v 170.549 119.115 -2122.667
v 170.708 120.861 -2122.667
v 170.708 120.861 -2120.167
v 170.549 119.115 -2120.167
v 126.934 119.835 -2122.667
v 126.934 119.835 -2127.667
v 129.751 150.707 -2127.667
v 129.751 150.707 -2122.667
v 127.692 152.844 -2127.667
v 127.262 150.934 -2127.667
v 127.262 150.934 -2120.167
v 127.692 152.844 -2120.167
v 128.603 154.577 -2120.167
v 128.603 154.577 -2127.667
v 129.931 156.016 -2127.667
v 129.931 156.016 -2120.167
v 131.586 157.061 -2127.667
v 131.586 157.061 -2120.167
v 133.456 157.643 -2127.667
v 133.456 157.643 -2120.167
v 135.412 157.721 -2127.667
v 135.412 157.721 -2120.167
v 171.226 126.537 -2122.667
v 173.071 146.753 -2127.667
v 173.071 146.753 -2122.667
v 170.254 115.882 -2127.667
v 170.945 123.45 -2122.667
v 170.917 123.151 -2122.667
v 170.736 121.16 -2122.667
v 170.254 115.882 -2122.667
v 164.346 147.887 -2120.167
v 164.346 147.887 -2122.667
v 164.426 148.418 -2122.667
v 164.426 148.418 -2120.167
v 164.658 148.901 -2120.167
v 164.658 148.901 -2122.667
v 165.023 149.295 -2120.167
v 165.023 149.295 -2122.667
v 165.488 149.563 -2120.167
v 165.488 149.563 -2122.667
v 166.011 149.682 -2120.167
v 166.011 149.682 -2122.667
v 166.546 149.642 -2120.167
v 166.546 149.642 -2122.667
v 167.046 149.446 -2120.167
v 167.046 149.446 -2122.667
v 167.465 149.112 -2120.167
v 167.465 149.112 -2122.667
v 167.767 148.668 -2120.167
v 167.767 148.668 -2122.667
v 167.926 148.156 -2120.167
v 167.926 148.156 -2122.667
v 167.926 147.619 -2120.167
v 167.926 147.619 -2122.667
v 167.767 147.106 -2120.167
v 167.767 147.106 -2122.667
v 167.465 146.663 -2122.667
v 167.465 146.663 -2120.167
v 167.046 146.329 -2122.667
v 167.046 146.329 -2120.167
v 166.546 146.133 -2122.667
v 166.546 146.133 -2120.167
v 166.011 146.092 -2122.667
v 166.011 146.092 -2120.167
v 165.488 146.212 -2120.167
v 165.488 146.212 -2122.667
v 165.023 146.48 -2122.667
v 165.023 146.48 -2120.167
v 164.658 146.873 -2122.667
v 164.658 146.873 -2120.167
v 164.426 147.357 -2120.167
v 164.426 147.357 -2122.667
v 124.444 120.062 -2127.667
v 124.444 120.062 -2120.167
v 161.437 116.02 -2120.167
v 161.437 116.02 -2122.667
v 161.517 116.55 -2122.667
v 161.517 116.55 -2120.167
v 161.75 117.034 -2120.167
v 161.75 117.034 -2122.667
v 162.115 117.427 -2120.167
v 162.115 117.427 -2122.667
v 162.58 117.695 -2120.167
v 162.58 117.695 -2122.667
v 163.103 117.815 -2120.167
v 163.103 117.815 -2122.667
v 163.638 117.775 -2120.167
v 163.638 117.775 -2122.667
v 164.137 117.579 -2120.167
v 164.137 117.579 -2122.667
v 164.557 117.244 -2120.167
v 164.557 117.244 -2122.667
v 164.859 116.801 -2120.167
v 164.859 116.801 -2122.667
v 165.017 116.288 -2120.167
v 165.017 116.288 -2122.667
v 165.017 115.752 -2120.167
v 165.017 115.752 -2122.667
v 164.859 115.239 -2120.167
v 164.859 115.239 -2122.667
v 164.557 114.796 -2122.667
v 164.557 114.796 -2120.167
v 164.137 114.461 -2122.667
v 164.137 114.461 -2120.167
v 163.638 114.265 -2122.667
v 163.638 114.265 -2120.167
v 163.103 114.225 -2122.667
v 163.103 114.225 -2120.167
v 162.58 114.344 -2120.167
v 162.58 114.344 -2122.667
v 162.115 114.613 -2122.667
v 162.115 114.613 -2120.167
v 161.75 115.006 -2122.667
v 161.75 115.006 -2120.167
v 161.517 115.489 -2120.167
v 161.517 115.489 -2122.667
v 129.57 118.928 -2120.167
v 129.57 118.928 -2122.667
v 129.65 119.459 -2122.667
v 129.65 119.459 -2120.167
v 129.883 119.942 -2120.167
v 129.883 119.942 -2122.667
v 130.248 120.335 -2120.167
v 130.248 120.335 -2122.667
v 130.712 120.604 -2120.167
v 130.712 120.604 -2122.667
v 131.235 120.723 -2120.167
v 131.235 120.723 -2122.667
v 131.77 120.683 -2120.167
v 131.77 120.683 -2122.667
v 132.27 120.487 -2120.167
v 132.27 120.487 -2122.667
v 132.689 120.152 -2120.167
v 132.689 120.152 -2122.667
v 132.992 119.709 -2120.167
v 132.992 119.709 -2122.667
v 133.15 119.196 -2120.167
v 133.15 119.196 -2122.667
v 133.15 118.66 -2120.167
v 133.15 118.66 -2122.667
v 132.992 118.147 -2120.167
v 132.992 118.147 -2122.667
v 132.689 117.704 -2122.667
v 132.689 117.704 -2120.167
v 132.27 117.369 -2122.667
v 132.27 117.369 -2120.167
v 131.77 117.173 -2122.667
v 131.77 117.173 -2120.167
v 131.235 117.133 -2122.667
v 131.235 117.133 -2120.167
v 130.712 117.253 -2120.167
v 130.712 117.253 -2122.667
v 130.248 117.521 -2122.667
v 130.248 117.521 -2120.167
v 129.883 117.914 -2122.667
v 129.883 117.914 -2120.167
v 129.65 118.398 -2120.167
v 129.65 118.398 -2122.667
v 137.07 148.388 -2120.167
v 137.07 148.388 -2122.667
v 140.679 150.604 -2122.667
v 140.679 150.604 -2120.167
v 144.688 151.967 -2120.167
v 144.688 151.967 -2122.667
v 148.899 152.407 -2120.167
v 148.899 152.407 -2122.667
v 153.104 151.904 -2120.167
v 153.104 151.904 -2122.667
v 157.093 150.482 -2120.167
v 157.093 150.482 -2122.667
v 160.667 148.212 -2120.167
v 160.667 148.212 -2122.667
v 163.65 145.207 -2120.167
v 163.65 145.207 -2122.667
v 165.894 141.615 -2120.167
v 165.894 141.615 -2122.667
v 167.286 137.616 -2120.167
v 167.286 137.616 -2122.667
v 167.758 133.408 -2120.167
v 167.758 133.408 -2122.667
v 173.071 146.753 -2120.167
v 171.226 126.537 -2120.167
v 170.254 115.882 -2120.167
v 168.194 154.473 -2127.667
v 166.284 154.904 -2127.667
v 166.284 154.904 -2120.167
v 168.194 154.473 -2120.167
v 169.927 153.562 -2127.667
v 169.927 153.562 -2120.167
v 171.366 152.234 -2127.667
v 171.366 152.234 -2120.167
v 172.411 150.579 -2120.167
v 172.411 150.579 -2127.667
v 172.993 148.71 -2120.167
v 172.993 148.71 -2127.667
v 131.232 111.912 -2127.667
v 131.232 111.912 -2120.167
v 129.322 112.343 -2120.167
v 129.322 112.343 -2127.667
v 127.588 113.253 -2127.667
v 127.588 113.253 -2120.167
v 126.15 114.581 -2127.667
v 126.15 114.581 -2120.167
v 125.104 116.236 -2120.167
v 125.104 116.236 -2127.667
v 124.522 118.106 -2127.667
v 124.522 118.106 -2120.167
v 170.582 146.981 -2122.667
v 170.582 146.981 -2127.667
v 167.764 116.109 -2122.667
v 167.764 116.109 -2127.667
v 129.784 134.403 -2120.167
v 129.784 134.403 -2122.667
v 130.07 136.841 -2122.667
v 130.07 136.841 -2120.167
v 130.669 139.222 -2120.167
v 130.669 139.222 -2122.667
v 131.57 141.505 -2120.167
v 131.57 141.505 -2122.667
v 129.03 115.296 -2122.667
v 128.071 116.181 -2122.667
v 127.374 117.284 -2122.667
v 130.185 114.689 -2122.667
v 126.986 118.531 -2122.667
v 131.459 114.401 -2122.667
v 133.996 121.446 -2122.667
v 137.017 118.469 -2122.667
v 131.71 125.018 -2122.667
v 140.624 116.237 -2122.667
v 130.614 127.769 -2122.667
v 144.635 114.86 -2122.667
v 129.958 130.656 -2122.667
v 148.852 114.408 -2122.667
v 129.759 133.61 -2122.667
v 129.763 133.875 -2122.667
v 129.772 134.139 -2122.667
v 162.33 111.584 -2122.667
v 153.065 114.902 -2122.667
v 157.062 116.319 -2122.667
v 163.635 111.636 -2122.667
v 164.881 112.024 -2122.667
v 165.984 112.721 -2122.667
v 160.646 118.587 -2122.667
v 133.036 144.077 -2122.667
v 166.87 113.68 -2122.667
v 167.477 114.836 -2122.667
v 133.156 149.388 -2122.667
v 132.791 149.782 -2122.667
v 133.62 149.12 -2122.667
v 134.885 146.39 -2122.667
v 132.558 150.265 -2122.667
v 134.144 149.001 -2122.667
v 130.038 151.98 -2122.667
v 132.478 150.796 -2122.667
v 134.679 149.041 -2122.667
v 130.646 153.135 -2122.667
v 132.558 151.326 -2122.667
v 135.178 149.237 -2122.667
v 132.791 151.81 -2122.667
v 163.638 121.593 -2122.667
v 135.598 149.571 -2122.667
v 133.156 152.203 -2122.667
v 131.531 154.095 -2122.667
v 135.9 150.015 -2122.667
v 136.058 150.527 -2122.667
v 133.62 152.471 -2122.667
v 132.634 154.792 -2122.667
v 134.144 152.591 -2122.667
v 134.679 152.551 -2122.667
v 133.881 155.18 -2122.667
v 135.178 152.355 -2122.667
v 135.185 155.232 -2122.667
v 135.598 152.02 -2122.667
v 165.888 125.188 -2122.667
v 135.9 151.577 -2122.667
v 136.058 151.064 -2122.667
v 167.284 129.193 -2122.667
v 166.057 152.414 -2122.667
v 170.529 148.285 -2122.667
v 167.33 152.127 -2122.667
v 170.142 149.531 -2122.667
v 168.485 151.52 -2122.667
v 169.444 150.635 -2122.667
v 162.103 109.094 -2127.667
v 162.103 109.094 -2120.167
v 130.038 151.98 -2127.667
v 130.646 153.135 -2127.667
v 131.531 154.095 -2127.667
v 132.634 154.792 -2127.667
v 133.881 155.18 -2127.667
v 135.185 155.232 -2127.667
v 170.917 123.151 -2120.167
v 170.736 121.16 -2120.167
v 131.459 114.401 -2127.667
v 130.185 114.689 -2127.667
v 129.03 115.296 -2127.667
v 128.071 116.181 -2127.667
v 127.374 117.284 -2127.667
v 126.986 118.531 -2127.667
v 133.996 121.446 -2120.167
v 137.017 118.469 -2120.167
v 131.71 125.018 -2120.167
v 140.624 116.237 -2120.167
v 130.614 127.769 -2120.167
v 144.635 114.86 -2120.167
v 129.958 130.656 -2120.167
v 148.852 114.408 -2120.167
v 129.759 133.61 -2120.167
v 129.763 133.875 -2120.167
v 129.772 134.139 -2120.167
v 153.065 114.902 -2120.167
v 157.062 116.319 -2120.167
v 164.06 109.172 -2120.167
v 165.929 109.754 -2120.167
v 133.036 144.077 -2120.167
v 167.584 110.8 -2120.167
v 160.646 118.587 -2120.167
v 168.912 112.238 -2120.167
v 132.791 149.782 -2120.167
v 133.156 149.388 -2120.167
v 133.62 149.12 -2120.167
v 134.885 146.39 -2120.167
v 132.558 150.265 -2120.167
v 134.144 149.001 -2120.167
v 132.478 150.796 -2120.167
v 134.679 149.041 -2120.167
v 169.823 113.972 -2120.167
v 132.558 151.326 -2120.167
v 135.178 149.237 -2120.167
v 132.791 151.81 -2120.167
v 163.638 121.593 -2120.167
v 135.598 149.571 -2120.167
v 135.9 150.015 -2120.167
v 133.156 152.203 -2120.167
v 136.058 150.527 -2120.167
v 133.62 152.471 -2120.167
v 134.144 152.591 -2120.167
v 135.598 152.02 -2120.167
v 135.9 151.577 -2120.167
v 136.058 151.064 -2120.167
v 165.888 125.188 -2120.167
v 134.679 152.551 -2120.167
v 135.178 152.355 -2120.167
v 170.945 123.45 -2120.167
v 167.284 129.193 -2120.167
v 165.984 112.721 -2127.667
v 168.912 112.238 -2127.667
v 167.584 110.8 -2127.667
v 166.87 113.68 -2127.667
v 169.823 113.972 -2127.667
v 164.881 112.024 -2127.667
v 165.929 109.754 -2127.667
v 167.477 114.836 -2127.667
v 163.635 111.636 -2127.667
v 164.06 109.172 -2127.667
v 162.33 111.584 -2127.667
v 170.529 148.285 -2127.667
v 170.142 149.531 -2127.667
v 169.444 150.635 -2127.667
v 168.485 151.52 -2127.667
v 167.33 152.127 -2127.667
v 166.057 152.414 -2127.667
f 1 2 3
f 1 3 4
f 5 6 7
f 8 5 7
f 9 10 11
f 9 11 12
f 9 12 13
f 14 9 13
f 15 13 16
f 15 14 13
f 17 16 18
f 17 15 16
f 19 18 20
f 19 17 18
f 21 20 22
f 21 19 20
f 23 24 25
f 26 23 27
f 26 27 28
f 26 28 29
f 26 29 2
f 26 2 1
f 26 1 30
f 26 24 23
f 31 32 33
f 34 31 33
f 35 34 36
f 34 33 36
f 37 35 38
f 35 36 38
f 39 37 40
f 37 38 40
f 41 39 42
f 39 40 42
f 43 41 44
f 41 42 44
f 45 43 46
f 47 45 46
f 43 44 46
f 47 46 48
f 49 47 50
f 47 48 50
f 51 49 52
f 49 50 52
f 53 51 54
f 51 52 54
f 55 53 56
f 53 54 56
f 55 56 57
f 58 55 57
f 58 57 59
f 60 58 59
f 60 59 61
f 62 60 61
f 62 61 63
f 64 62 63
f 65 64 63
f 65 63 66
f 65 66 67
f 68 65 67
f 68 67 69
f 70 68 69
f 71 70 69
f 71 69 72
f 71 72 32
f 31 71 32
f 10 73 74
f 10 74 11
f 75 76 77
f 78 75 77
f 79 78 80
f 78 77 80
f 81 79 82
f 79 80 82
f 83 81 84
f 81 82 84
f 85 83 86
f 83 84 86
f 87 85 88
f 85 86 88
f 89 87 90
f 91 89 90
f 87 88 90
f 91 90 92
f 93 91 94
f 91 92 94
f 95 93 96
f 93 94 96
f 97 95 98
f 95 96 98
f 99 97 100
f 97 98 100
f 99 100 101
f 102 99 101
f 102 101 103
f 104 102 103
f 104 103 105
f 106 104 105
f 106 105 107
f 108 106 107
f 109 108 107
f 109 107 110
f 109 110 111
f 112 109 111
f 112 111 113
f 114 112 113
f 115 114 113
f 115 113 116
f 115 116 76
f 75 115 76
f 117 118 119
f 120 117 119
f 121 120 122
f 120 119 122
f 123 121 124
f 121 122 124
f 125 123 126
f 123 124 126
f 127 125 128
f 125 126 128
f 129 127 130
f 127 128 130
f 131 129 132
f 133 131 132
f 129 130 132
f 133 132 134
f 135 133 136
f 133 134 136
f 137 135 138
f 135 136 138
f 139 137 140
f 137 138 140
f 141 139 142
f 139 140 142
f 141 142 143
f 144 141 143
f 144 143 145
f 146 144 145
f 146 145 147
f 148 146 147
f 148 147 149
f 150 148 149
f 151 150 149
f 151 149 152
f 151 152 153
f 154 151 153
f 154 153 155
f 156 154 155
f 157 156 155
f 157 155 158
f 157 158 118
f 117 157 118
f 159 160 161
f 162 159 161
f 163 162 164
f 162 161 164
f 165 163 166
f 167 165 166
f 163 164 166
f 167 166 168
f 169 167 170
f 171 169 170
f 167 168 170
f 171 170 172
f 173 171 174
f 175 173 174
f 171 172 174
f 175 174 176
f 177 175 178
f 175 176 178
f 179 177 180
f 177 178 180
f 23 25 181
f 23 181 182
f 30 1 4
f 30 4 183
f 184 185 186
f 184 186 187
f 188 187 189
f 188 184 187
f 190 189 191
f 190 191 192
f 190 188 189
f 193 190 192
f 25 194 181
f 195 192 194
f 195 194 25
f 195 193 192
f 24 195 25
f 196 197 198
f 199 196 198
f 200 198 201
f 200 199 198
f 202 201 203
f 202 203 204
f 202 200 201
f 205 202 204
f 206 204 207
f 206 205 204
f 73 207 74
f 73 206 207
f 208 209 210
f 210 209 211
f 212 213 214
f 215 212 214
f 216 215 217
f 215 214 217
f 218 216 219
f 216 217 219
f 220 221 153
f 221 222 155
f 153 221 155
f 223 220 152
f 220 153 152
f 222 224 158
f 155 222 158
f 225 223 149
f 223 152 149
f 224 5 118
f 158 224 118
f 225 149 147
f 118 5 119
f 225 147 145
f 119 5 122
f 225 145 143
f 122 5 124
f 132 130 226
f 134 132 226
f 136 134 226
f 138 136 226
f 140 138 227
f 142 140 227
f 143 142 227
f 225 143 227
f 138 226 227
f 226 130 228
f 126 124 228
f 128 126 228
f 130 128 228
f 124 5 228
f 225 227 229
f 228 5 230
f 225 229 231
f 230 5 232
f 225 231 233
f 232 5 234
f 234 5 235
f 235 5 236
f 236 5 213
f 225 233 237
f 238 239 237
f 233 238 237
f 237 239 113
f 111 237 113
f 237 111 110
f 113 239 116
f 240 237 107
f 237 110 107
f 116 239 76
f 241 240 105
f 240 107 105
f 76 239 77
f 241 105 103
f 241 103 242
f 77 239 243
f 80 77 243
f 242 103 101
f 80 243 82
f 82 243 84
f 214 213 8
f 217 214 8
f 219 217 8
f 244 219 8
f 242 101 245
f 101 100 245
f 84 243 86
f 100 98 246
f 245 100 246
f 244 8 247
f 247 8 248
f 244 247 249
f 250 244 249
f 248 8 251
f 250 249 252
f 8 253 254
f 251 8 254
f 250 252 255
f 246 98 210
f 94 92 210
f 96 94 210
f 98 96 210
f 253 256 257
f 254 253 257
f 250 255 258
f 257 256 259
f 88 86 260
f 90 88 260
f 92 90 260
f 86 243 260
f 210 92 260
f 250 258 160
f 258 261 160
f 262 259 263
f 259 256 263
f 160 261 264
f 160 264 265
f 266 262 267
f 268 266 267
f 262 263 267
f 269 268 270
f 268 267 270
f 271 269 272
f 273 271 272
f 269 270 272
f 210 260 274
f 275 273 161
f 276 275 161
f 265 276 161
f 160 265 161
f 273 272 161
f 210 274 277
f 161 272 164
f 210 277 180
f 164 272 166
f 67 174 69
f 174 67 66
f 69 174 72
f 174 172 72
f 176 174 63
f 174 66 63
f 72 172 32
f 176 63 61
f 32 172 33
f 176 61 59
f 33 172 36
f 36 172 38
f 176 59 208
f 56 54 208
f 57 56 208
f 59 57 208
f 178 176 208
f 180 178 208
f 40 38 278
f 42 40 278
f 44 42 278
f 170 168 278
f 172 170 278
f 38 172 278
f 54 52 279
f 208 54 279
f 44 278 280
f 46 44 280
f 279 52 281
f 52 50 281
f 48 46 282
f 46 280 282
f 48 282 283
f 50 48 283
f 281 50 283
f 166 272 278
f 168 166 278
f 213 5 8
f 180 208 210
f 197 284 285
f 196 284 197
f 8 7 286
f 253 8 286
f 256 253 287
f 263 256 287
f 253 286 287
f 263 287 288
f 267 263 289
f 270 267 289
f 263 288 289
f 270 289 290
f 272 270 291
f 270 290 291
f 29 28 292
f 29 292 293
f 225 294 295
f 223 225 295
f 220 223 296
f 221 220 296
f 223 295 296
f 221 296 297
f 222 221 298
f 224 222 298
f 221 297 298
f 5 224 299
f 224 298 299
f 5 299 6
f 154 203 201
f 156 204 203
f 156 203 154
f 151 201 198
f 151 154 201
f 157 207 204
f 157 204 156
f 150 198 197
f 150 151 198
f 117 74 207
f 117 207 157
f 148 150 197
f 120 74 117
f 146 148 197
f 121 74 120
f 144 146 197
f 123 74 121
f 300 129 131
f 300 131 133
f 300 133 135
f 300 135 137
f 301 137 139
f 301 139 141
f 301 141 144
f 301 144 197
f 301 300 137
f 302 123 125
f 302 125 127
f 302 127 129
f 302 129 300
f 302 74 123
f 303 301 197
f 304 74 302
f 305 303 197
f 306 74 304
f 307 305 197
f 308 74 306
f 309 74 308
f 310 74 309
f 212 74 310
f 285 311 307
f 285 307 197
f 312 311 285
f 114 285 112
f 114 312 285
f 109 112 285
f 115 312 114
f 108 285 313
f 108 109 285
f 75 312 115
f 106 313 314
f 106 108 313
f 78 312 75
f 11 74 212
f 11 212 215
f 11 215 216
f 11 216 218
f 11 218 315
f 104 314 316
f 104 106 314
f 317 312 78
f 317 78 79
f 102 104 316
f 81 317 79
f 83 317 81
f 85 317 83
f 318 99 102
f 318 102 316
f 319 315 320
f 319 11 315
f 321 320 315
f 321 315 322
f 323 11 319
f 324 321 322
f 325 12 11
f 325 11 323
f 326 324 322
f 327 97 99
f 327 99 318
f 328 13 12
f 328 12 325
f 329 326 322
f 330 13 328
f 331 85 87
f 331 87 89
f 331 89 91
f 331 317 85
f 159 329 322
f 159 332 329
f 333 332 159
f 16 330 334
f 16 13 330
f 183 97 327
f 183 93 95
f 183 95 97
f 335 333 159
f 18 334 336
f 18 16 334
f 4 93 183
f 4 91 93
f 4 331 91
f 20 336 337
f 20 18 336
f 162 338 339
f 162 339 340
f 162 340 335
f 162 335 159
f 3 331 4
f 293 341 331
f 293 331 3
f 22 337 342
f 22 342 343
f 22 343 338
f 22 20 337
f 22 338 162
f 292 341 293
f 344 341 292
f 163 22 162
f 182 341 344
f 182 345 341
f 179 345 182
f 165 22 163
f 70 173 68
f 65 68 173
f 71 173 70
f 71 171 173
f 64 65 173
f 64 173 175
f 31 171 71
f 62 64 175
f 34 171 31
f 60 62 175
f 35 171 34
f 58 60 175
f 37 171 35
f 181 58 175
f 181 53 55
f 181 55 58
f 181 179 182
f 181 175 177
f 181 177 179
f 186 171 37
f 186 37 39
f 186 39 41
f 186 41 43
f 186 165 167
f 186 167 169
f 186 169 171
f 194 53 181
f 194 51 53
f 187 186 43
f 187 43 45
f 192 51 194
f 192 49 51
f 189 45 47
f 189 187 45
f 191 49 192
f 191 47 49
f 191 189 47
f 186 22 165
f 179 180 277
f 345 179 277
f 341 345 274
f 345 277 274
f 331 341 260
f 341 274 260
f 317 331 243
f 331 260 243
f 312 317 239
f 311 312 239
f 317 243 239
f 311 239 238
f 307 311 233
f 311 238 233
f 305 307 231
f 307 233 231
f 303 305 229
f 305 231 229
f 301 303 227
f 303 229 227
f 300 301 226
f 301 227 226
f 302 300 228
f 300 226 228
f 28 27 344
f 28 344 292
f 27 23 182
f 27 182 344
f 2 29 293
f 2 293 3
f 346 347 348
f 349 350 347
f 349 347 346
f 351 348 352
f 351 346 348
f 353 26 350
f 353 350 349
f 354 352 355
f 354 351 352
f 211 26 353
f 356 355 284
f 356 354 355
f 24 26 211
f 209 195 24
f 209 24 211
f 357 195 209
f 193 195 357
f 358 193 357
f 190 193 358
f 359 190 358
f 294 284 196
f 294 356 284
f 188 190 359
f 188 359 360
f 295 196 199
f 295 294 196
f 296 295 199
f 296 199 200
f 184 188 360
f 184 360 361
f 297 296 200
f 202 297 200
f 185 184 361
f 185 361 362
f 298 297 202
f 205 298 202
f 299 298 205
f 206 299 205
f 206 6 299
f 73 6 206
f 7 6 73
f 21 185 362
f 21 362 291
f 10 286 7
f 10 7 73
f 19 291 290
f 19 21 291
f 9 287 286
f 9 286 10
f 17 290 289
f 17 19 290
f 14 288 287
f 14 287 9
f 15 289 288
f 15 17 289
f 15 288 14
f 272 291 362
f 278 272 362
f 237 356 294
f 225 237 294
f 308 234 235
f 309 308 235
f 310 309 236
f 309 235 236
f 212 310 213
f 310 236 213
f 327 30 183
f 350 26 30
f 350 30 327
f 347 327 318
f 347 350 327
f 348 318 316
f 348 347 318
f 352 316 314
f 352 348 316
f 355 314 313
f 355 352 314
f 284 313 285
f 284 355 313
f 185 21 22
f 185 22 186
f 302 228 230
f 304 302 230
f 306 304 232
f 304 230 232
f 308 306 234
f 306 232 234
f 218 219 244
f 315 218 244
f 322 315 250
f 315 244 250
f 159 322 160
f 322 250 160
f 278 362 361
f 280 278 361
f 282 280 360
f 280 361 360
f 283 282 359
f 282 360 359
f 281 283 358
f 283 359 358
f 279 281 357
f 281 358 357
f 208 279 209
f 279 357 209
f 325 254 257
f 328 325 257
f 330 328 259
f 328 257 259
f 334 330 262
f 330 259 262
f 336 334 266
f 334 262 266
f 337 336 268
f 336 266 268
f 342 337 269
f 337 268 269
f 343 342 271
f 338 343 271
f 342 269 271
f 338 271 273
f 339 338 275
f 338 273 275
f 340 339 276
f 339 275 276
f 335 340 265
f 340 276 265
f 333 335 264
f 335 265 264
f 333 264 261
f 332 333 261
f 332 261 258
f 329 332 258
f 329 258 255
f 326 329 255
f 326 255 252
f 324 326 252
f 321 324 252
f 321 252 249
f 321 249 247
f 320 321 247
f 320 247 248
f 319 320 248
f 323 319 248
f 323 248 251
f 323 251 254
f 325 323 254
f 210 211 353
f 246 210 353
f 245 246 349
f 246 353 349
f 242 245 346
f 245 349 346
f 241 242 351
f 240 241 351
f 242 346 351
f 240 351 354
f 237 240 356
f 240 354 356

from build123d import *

# Parameters (mm, degrees)
BOSS_EXTRUDE2_DEPTH  = 2.5
BOSS_EXTRUDE3_START  = 5
BOSS_EXTRUDE3_DEPTH  = 5
M3_CLEARANCE_HOLE1_D = 3.6


with BuildPart() as part:
    # Sketch2 → Boss-Extrude2 (new body)
    # profile 1 of 3: a face of its own
    with BuildSketch(Plane.XY.offset(-2122.666602395)):
        with BuildLine():
            Line((135.41215099, 157.721273751), (166.283860401, 154.903906532))
            ThreePointArc((166.283860401, 154.903906532), (171.365571849, 152.234319322), (173.071201254, 146.753323477))
            Line((173.071201254, 146.753323477), (171.22628014, 126.537333121))
            Line((171.22628014, 126.537333121), (170.944543418, 123.45016218))
            Line((170.944543418, 123.45016218), (170.917278574, 123.151403701))
            Line((170.917278574, 123.151403701), (170.735512947, 121.159680514))
            Line((170.735512947, 121.159680514), (170.708248103, 120.860922035))
            Line((170.708248103, 120.860922035), (170.548948667, 119.115375386))
            Line((170.548948667, 119.115375386), (170.253834036, 115.881614066))
            ThreePointArc((170.253834036, 115.881614066), (167.584246825, 110.799902618), (162.10325098, 109.094273213))
            Line((162.10325098, 109.094273213), (131.231541569, 111.911640431))
            ThreePointArc((131.231541569, 111.911640431), (126.149830121, 114.581227642), (124.444200716, 120.062223487))
            Line((124.444200716, 120.062223487), (127.261567935, 150.933932898))
            ThreePointArc((127.261567935, 150.933932898), (129.931155146, 156.015644346), (135.41215099, 157.721273751))
        make_face()
        with BuildLine():
            ThreePointArc((170.581547269, 146.980530511), (169.444460999, 150.63452774), (166.056653367, 152.414252548))
            Line((166.056653367, 152.414252548), (135.184943956, 155.231619766))
            ThreePointArc((135.184943956, 155.231619766), (131.530946727, 154.094533496), (129.751221919, 150.706725864))
            Line((129.751221919, 150.706725864), (126.933854701, 119.835016453))
            ThreePointArc((126.933854701, 119.835016453), (128.070940971, 116.181019223), (131.458748603, 114.401294416))
            Line((131.458748603, 114.401294416), (162.330458014, 111.583927198))
            ThreePointArc((162.330458014, 111.583927198), (165.984455244, 112.721013468), (167.764180051, 116.1088211))
            Line((167.764180051, 116.1088211), (168.059294682, 119.34258242))
            Line((168.059294682, 119.34258242), (168.218594119, 121.088129069))
            Line((168.218594119, 121.088129069), (168.245858963, 121.386887547))
            Line((168.245858963, 121.386887547), (168.42762459, 123.378610735))
            Line((168.42762459, 123.378610735), (168.454889434, 123.677369213))
            Line((168.454889434, 123.677369213), (168.736626156, 126.764540154))
            Line((168.736626156, 126.764540154), (170.581547269, 146.980530511))
        make_face(mode=Mode.SUBTRACT)
    # profile 2 of 3: a face of its own
    with BuildSketch(Plane.XY.offset(-2122.666602395)):
        with BuildLine():
            Line((170.581547269, 146.980530511), (168.736626156, 126.764540154))
            Line((168.736626156, 126.764540154), (168.454889434, 123.677369213))
            Line((168.454889434, 123.677369213), (168.42762459, 123.378610735))
            Line((168.42762459, 123.378610735), (168.245858963, 121.386887547))
            Line((168.245858963, 121.386887547), (168.218594119, 121.088129069))
            Line((168.218594119, 121.088129069), (168.059294682, 119.34258242))
            Line((168.059294682, 119.34258242), (167.764180051, 116.1088211))
            ThreePointArc((167.764180051, 116.1088211), (165.984455244, 112.721013468), (162.330458014, 111.583927198))
            Line((162.330458014, 111.583927198), (131.458748603, 114.401294416))
            ThreePointArc((131.458748603, 114.401294416), (128.070940971, 116.181019223), (126.933854701, 119.835016453))
            Line((126.933854701, 119.835016453), (129.751221919, 150.706725864))
            ThreePointArc((129.751221919, 150.706725864), (131.530946727, 154.094533496), (135.184943956, 155.231619766))
            Line((135.184943956, 155.231619766), (166.056653367, 152.414252548))
            ThreePointArc((166.056653367, 152.414252548), (169.444460999, 150.63452774), (170.581547269, 146.980530511))
        make_face()
        with BuildLine():
            ThreePointArc((170.332581871, 147.003251214), (169.252349914, 150.474548582), (166.033932664, 152.165287149))
            Line((166.033932664, 152.165287149), (135.162223253, 154.982654367))
            ThreePointArc((135.162223253, 154.982654367), (131.690925885, 153.902422411), (130.000187318, 150.684005161))
            Line((130.000187318, 150.684005161), (127.1828201, 119.81229575))
            ThreePointArc((127.1828201, 119.81229575), (128.263052056, 116.340998381), (131.481469307, 114.650259814))
            Line((131.481469307, 114.650259814), (162.353178718, 111.832892596))
            ThreePointArc((162.353178718, 111.832892596), (165.824476086, 112.913124553), (167.515214653, 116.131541803))
            Line((167.515214653, 116.131541803), (167.810329284, 119.365303123))
            Line((167.810329284, 119.365303123), (167.96962872, 121.110849773))
            Line((167.96962872, 121.110849773), (167.996893564, 121.409608251))
            Line((167.996893564, 121.409608251), (168.178659191, 123.401331438))
            Line((168.178659191, 123.401331438), (168.205924035, 123.700089917))
            Line((168.205924035, 123.700089917), (168.487660757, 126.787260858))
            Line((168.487660757, 126.787260858), (170.332581871, 147.003251214))
        make_face(mode=Mode.SUBTRACT)
    # profile 3 of 3: a face of its own
    with BuildSketch(Plane.XY.offset(-2122.666602395)):
        with BuildLine():
            Line((130.000187318, 150.684005161), (127.1828201, 119.81229575))
            ThreePointArc((127.1828201, 119.81229575), (128.263052056, 116.340998381), (131.481469307, 114.650259814))
            Line((131.481469307, 114.650259814), (162.353178718, 111.832892596))
            ThreePointArc((162.353178718, 111.832892596), (165.824476086, 112.913124553), (167.515214653, 116.131541803))
            Line((167.515214653, 116.131541803), (167.810329284, 119.365303123))
            Line((167.810329284, 119.365303123), (167.96962872, 121.110849773))
            Line((167.96962872, 121.110849773), (167.996893564, 121.409608251))
            Line((167.996893564, 121.409608251), (168.178659191, 123.401331438))
            Line((168.178659191, 123.401331438), (168.205924035, 123.700089917))
            Line((168.205924035, 123.700089917), (168.487660757, 126.787260858))
            Line((168.487660757, 126.787260858), (170.332581871, 147.003251214))
            ThreePointArc((170.332581871, 147.003251214), (169.252349914, 150.474548582), (166.033932664, 152.165287149))
            Line((166.033932664, 152.165287149), (135.162223253, 154.982654367))
            ThreePointArc((135.162223253, 154.982654367), (131.690925885, 153.902422411), (130.000187318, 150.684005161))
        make_face()
        with BuildLine():
            ThreePointArc((129.758780791, 133.610335718), (129.767141126, 134.006635943), (129.783767025, 134.402675515))
            ThreePointArc((129.783767025, 134.402675515), (130.33124015, 138.04086544), (131.56963679, 141.505331708))
            ThreePointArc((131.56963679, 141.505331708), (133.915565147, 145.269940389), (137.070437532, 148.388022911))
            ThreePointArc((137.070437532, 148.388022911), (157.092627331, 150.481993898), (167.757700985, 133.407773482))
            ThreePointArc((167.757700985, 133.407773482), (153.064517377, 114.902332861), (131.710192294, 125.018348745))
            ThreePointArc((131.710192294, 125.018348745), (130.229565113, 129.199664511), (129.758780791, 133.610335718))
        make_face(mode=Mode.SUBTRACT)
    extrude(amount=BOSS_EXTRUDE2_DEPTH)

    # Sketch4 → Boss-Extrude3 (add)
    with BuildSketch(Plane(origin=(0, 0, -2122.666602395), x_dir=(-1, 0, 0), z_dir=(0, 0, -1)).offset(BOSS_EXTRUDE3_START)):
        with BuildLine():
            Line((-135.41215099, 157.721273751), (-166.283860401, 154.903906532))
            ThreePointArc((-166.283860401, 154.903906532), (-171.365571849, 152.234319322), (-173.071201254, 146.753323477))
            Line((-173.071201254, 146.753323477), (-170.253834036, 115.881614066))
            ThreePointArc((-170.253834036, 115.881614066), (-167.584246825, 110.799902618), (-162.10325098, 109.094273213))
            Line((-162.10325098, 109.094273213), (-131.231541569, 111.911640431))
            ThreePointArc((-131.231541569, 111.911640431), (-126.149830121, 114.581227642), (-124.444200716, 120.062223487))
            Line((-124.444200716, 120.062223487), (-127.261567935, 150.933932898))
            ThreePointArc((-127.261567935, 150.933932898), (-129.931155146, 156.015644346), (-135.41215099, 157.721273751))
        make_face()
        with BuildLine():
            Line((-135.184943956, 155.231619766), (-166.056653367, 152.414252548))
            ThreePointArc((-166.056653367, 152.414252548), (-169.444460999, 150.63452774), (-170.581547269, 146.980530511))
            Line((-170.581547269, 146.980530511), (-167.764180051, 116.1088211))
            ThreePointArc((-167.764180051, 116.1088211), (-165.984455244, 112.721013468), (-162.330458014, 111.583927198))
            Line((-162.330458014, 111.583927198), (-131.458748603, 114.401294416))
            ThreePointArc((-131.458748603, 114.401294416), (-128.070940971, 116.181019223), (-126.933854701, 119.835016453))
            Line((-126.933854701, 119.835016453), (-129.751221919, 150.706725864))
            ThreePointArc((-129.751221919, 150.706725864), (-131.530946727, 154.094533496), (-135.184943956, 155.231619766))
        make_face(mode=Mode.SUBTRACT)
    extrude(amount=-BOSS_EXTRUDE3_DEPTH)

    # M3 Clearance Hole1 (through all)
    with Locations(Plane.XY.offset(-2120.166602395)):
        with Locations((134.278040499, 150.795684), (131.369790467, 118.928112995), (163.237361472, 116.019862963), (166.145611504, 147.887433968)):
            Hole(M3_CLEARANCE_HOLE1_D / 2)


solid = part.part
